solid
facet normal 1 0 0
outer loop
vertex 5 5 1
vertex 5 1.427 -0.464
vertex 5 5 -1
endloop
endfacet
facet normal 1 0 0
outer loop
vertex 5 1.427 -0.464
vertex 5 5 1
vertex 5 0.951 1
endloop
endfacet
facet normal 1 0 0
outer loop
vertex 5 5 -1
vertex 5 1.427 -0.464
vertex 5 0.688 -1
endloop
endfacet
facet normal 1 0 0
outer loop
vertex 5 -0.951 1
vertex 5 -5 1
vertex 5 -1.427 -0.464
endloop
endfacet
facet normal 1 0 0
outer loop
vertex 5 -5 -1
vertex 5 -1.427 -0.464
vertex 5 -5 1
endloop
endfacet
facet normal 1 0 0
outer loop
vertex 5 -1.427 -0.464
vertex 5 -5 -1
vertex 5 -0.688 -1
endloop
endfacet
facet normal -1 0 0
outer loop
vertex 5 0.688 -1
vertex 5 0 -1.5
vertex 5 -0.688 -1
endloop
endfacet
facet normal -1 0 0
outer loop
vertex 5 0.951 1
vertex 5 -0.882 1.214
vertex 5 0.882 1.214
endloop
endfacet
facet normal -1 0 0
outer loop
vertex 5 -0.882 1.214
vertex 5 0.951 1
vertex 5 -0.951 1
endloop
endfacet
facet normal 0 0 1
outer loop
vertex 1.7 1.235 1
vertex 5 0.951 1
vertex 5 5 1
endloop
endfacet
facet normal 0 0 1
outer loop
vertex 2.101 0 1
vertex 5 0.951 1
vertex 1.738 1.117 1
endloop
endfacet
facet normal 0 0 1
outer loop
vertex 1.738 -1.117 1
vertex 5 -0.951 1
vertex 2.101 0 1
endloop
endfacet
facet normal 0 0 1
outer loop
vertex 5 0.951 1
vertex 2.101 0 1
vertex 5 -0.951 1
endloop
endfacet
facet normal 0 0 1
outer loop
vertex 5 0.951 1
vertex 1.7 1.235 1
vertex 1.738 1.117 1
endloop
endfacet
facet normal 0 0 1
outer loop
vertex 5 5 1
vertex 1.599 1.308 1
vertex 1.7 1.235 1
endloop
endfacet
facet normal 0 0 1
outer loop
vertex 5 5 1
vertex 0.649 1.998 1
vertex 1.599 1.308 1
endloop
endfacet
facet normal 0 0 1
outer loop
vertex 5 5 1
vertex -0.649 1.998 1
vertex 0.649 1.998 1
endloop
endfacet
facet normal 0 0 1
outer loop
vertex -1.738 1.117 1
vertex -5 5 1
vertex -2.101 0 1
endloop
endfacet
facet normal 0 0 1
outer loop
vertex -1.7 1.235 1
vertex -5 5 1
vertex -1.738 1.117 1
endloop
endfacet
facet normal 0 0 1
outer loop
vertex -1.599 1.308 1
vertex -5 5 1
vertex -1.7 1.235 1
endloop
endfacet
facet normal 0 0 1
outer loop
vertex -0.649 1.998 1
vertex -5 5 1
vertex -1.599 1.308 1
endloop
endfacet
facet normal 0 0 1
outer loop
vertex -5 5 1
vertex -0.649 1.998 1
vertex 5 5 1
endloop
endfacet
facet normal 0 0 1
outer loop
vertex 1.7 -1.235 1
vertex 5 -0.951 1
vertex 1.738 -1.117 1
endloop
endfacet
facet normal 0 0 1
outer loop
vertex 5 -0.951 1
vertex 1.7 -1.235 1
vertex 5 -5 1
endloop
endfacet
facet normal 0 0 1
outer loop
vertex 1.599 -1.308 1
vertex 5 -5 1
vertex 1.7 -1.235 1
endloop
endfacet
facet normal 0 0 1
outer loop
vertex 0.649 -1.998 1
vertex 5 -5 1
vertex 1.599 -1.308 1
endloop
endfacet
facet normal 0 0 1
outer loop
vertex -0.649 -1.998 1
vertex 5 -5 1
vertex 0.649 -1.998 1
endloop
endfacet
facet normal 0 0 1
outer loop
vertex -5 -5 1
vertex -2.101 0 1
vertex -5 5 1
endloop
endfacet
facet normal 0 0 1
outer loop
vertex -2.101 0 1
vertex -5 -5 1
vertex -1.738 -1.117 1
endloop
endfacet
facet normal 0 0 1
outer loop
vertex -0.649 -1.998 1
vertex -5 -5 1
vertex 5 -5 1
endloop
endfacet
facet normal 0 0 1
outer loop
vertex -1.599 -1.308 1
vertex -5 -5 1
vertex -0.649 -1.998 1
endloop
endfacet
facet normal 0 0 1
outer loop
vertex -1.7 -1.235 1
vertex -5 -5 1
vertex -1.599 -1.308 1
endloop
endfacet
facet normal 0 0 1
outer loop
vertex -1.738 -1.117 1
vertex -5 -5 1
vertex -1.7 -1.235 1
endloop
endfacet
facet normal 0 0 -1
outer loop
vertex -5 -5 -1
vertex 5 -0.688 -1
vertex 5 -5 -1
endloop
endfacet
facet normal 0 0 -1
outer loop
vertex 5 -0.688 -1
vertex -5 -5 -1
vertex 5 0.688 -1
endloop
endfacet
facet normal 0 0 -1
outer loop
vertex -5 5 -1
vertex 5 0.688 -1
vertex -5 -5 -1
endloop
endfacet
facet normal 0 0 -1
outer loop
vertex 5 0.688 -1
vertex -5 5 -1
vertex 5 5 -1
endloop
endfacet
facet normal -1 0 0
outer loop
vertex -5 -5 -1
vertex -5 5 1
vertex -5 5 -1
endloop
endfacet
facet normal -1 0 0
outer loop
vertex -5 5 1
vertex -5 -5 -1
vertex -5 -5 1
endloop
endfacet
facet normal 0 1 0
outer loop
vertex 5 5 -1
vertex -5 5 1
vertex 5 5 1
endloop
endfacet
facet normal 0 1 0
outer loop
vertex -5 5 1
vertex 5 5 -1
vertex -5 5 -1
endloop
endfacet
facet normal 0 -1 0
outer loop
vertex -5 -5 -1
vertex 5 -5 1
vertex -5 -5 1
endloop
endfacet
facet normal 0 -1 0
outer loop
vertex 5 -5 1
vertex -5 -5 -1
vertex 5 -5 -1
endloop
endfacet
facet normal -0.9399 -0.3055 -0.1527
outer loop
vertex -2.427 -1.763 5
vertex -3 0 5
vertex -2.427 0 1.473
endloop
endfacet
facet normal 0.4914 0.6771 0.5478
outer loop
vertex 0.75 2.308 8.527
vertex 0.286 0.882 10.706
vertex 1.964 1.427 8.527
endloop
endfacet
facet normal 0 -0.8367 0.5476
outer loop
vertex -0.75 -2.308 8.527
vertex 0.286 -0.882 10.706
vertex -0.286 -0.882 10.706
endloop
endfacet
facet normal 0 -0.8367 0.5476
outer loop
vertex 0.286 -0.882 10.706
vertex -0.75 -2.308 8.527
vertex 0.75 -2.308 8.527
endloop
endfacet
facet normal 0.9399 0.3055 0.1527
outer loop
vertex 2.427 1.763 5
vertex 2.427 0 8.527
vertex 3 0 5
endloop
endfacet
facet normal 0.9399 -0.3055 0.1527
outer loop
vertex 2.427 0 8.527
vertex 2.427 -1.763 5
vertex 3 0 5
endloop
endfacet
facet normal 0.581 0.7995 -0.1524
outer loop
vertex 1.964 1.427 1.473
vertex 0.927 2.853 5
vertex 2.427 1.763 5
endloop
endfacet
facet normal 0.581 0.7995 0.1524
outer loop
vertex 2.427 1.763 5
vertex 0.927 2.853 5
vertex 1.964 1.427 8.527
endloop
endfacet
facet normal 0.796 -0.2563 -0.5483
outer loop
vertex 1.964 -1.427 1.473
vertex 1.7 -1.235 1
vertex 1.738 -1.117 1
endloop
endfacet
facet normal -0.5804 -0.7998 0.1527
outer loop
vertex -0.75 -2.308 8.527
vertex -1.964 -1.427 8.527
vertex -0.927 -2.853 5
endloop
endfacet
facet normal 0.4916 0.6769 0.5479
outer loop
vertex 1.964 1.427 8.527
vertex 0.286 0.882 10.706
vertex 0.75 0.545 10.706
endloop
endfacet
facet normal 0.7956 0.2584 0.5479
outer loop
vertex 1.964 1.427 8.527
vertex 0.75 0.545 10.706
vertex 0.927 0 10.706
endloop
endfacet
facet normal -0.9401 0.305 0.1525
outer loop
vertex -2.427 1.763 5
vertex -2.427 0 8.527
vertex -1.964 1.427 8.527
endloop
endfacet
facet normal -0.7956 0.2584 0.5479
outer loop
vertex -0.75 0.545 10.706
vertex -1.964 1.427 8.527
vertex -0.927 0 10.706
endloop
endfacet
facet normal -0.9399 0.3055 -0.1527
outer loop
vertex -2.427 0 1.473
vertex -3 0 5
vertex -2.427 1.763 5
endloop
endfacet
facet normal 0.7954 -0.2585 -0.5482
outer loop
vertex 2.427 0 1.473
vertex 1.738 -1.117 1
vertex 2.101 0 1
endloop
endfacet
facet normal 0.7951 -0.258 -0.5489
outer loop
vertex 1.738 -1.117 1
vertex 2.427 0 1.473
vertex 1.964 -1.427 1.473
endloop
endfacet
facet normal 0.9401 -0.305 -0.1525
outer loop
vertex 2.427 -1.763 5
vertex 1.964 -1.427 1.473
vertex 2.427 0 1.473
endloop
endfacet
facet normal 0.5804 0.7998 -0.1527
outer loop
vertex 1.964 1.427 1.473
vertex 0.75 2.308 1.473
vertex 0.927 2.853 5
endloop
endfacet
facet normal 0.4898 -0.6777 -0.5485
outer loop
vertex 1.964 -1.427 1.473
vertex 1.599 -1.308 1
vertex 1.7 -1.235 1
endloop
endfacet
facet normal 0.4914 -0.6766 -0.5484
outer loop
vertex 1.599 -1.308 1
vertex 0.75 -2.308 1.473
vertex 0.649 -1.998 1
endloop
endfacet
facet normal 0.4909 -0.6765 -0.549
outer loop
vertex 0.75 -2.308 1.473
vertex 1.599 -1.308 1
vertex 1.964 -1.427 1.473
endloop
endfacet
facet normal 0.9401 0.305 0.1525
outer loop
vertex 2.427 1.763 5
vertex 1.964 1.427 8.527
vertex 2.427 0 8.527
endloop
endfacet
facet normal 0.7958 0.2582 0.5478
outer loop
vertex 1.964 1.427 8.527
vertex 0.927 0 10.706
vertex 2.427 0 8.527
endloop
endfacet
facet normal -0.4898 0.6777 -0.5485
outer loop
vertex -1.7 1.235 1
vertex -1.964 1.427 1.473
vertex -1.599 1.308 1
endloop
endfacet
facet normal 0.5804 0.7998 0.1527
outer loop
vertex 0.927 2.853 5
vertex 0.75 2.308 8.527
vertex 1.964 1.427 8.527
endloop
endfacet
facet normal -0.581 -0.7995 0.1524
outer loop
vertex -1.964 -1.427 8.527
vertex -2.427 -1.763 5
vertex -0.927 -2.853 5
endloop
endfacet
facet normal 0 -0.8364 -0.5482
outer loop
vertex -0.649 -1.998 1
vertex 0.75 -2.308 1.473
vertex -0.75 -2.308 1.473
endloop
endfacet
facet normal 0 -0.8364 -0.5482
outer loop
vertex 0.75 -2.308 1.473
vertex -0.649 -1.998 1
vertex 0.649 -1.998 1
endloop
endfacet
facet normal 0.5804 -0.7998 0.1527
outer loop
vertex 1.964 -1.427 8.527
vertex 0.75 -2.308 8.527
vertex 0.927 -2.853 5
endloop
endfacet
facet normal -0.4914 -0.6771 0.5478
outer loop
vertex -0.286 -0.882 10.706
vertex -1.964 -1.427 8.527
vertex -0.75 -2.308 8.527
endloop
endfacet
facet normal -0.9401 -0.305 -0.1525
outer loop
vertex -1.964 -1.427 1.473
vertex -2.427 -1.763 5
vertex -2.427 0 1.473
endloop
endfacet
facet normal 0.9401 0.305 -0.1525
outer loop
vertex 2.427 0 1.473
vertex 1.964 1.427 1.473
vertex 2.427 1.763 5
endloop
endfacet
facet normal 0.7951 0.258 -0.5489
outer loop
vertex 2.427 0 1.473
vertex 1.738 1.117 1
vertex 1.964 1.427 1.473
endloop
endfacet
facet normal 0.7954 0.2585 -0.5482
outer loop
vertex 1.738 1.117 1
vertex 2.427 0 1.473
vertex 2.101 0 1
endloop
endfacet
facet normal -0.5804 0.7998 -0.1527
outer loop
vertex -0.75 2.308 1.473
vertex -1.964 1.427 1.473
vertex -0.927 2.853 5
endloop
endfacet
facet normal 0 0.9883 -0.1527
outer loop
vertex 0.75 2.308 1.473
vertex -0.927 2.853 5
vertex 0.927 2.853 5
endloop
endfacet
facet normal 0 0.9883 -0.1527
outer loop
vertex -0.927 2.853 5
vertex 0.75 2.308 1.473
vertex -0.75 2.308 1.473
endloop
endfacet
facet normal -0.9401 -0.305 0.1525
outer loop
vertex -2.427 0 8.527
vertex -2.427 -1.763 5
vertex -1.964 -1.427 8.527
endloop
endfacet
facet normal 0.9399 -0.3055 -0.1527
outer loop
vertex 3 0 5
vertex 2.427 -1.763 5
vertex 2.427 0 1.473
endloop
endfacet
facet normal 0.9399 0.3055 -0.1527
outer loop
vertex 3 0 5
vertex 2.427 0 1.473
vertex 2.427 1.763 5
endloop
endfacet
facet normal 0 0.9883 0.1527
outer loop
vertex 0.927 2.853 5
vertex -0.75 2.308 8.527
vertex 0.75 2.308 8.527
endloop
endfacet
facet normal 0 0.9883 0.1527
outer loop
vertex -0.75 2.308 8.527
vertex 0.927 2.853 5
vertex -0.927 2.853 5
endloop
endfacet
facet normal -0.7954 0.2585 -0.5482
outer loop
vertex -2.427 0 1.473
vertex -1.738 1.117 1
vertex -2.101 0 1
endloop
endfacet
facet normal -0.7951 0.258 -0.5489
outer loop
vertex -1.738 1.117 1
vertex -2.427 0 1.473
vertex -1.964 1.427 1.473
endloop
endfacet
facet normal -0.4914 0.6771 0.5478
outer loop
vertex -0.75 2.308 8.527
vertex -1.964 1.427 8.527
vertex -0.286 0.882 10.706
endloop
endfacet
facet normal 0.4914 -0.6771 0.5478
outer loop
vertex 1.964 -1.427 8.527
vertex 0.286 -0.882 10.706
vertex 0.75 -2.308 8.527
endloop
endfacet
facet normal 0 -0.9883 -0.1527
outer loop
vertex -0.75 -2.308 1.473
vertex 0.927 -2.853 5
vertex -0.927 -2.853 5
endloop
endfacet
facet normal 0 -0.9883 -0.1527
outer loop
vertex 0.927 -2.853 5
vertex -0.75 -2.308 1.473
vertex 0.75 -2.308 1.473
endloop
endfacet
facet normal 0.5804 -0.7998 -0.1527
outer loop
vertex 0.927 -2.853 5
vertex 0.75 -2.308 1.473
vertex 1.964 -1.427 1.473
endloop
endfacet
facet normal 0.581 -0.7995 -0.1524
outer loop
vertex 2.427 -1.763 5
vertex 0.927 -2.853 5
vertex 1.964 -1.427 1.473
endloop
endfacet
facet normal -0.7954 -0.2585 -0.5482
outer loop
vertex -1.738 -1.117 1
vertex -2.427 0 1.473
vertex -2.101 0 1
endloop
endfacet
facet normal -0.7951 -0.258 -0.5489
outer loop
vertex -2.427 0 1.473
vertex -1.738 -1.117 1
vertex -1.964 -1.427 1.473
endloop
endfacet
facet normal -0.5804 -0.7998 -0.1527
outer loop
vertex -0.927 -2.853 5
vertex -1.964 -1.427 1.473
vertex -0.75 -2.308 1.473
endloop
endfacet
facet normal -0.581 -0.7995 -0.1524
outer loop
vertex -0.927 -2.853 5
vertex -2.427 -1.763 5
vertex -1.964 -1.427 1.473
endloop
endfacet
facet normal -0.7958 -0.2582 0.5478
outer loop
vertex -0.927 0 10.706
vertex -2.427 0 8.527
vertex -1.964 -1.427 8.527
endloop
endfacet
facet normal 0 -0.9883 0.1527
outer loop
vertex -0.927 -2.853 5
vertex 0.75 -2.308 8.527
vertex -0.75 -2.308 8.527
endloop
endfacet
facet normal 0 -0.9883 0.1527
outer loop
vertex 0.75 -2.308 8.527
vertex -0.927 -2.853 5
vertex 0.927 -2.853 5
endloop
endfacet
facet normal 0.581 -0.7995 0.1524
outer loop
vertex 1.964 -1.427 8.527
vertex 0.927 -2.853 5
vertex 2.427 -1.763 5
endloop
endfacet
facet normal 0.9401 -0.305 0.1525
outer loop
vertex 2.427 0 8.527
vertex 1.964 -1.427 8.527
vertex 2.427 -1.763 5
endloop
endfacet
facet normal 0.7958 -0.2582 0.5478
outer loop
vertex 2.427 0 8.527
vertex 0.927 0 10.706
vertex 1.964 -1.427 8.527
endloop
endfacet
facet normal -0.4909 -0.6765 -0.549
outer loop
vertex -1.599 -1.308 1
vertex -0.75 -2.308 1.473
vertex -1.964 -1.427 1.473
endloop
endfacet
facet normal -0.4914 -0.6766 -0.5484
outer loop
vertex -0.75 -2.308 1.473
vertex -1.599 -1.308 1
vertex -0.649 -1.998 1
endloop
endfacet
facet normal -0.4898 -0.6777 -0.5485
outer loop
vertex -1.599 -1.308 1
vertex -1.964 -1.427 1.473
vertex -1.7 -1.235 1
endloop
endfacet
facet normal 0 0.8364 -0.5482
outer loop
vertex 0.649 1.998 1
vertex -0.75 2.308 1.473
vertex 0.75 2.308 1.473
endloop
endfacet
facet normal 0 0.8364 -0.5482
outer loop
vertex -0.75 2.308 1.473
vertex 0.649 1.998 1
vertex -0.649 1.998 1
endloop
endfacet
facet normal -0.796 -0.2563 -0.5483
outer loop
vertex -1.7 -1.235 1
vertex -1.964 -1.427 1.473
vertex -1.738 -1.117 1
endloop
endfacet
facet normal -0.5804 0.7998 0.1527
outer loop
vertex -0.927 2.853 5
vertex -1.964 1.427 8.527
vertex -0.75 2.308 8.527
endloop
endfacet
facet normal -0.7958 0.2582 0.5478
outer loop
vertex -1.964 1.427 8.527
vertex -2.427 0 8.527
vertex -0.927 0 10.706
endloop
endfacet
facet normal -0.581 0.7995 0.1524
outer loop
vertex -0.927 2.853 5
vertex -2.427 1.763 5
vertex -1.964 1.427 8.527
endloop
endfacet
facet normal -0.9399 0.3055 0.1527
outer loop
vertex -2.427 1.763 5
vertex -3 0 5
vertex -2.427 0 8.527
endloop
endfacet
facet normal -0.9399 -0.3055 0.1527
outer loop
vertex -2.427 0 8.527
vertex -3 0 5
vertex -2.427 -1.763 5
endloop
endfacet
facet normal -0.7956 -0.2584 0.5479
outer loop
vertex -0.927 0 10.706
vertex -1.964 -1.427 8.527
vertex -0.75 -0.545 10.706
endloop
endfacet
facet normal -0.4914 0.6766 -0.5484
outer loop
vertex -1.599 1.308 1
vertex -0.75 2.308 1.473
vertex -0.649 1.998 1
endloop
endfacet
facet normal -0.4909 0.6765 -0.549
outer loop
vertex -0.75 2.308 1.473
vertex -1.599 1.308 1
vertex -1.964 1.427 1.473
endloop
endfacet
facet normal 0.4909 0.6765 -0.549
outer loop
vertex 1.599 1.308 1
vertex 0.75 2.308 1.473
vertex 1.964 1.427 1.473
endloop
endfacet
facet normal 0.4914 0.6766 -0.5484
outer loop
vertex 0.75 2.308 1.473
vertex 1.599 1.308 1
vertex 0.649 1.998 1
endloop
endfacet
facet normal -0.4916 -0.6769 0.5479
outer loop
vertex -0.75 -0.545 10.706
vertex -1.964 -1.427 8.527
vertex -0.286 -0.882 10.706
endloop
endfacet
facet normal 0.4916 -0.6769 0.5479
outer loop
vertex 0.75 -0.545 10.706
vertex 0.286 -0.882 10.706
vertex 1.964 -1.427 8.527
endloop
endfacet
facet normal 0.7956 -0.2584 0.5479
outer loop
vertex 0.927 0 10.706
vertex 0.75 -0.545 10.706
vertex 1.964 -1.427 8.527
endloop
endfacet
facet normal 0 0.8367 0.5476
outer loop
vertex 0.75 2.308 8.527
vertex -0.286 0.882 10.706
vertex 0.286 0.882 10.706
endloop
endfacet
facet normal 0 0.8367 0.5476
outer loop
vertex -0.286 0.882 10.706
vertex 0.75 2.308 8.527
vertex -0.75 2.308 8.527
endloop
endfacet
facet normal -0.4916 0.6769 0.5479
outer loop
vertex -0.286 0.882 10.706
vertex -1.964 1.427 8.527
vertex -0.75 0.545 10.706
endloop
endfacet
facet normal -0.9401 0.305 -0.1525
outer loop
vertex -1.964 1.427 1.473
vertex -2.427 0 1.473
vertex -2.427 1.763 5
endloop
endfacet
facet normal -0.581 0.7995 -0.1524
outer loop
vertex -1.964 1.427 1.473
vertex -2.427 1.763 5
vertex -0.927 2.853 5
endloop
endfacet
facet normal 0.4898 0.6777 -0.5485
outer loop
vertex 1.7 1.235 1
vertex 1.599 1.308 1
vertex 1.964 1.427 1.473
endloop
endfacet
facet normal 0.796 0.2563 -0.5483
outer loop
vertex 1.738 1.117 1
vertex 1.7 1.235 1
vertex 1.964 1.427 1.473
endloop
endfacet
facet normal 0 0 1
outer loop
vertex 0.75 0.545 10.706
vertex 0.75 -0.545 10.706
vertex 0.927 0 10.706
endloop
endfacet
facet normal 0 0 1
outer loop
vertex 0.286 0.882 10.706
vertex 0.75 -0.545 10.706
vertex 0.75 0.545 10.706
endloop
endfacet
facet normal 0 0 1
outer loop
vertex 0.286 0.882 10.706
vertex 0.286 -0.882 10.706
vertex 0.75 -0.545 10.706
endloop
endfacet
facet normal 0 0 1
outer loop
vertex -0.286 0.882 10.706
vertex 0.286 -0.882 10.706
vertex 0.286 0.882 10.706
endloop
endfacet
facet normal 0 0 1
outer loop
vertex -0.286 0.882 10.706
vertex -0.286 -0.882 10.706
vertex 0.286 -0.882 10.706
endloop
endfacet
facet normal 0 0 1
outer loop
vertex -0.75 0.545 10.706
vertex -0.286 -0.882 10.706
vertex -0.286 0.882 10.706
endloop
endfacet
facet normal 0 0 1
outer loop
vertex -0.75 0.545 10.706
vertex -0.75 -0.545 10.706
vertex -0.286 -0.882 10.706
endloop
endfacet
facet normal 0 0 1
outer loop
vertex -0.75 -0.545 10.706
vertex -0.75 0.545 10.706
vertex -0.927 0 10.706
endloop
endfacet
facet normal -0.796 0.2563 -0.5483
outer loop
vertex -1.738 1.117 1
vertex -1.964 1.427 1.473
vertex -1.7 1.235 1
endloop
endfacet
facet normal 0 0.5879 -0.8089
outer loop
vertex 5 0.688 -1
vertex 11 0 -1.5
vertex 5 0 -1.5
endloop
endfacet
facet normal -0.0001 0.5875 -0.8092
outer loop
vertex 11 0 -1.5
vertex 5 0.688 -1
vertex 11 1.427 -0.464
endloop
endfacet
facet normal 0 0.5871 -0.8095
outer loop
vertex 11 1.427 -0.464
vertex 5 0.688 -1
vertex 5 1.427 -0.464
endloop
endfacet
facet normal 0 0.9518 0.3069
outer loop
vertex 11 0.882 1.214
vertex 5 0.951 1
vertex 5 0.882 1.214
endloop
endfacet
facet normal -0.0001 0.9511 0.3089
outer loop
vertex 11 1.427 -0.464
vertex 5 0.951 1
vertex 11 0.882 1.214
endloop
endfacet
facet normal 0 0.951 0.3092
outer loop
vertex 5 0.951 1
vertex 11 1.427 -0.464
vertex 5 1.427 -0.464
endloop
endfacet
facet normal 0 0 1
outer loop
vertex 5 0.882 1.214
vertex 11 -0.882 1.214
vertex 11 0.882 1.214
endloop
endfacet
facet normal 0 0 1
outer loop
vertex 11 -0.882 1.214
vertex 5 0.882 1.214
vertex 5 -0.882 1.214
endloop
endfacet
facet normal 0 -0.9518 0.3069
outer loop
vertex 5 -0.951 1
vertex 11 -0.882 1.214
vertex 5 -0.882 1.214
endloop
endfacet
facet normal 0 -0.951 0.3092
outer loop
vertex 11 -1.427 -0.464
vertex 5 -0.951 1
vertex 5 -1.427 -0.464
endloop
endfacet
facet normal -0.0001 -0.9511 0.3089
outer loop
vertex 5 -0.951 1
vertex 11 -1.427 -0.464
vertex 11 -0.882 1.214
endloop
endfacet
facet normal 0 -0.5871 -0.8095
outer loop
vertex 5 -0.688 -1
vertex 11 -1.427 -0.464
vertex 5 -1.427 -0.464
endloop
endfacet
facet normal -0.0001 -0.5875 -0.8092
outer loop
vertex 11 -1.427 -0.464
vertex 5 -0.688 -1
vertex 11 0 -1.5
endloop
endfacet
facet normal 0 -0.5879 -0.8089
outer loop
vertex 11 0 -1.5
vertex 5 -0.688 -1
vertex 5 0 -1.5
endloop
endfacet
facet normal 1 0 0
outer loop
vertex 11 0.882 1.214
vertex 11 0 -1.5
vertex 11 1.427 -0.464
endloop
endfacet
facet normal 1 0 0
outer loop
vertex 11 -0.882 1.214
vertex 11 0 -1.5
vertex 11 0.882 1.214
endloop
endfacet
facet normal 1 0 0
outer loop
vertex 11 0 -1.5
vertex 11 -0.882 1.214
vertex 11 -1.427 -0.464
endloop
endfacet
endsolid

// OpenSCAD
// translate / rotate / scale + union
union() {
  cube([10, 10, 2], center=true);
  translate([0, 0, 5]) scale([1, 1, 2]) sphere(3);
  rotate([0, 90, 0]) translate([0, 0, 8]) cylinder(h=6, r=1.5, center=true);
}
